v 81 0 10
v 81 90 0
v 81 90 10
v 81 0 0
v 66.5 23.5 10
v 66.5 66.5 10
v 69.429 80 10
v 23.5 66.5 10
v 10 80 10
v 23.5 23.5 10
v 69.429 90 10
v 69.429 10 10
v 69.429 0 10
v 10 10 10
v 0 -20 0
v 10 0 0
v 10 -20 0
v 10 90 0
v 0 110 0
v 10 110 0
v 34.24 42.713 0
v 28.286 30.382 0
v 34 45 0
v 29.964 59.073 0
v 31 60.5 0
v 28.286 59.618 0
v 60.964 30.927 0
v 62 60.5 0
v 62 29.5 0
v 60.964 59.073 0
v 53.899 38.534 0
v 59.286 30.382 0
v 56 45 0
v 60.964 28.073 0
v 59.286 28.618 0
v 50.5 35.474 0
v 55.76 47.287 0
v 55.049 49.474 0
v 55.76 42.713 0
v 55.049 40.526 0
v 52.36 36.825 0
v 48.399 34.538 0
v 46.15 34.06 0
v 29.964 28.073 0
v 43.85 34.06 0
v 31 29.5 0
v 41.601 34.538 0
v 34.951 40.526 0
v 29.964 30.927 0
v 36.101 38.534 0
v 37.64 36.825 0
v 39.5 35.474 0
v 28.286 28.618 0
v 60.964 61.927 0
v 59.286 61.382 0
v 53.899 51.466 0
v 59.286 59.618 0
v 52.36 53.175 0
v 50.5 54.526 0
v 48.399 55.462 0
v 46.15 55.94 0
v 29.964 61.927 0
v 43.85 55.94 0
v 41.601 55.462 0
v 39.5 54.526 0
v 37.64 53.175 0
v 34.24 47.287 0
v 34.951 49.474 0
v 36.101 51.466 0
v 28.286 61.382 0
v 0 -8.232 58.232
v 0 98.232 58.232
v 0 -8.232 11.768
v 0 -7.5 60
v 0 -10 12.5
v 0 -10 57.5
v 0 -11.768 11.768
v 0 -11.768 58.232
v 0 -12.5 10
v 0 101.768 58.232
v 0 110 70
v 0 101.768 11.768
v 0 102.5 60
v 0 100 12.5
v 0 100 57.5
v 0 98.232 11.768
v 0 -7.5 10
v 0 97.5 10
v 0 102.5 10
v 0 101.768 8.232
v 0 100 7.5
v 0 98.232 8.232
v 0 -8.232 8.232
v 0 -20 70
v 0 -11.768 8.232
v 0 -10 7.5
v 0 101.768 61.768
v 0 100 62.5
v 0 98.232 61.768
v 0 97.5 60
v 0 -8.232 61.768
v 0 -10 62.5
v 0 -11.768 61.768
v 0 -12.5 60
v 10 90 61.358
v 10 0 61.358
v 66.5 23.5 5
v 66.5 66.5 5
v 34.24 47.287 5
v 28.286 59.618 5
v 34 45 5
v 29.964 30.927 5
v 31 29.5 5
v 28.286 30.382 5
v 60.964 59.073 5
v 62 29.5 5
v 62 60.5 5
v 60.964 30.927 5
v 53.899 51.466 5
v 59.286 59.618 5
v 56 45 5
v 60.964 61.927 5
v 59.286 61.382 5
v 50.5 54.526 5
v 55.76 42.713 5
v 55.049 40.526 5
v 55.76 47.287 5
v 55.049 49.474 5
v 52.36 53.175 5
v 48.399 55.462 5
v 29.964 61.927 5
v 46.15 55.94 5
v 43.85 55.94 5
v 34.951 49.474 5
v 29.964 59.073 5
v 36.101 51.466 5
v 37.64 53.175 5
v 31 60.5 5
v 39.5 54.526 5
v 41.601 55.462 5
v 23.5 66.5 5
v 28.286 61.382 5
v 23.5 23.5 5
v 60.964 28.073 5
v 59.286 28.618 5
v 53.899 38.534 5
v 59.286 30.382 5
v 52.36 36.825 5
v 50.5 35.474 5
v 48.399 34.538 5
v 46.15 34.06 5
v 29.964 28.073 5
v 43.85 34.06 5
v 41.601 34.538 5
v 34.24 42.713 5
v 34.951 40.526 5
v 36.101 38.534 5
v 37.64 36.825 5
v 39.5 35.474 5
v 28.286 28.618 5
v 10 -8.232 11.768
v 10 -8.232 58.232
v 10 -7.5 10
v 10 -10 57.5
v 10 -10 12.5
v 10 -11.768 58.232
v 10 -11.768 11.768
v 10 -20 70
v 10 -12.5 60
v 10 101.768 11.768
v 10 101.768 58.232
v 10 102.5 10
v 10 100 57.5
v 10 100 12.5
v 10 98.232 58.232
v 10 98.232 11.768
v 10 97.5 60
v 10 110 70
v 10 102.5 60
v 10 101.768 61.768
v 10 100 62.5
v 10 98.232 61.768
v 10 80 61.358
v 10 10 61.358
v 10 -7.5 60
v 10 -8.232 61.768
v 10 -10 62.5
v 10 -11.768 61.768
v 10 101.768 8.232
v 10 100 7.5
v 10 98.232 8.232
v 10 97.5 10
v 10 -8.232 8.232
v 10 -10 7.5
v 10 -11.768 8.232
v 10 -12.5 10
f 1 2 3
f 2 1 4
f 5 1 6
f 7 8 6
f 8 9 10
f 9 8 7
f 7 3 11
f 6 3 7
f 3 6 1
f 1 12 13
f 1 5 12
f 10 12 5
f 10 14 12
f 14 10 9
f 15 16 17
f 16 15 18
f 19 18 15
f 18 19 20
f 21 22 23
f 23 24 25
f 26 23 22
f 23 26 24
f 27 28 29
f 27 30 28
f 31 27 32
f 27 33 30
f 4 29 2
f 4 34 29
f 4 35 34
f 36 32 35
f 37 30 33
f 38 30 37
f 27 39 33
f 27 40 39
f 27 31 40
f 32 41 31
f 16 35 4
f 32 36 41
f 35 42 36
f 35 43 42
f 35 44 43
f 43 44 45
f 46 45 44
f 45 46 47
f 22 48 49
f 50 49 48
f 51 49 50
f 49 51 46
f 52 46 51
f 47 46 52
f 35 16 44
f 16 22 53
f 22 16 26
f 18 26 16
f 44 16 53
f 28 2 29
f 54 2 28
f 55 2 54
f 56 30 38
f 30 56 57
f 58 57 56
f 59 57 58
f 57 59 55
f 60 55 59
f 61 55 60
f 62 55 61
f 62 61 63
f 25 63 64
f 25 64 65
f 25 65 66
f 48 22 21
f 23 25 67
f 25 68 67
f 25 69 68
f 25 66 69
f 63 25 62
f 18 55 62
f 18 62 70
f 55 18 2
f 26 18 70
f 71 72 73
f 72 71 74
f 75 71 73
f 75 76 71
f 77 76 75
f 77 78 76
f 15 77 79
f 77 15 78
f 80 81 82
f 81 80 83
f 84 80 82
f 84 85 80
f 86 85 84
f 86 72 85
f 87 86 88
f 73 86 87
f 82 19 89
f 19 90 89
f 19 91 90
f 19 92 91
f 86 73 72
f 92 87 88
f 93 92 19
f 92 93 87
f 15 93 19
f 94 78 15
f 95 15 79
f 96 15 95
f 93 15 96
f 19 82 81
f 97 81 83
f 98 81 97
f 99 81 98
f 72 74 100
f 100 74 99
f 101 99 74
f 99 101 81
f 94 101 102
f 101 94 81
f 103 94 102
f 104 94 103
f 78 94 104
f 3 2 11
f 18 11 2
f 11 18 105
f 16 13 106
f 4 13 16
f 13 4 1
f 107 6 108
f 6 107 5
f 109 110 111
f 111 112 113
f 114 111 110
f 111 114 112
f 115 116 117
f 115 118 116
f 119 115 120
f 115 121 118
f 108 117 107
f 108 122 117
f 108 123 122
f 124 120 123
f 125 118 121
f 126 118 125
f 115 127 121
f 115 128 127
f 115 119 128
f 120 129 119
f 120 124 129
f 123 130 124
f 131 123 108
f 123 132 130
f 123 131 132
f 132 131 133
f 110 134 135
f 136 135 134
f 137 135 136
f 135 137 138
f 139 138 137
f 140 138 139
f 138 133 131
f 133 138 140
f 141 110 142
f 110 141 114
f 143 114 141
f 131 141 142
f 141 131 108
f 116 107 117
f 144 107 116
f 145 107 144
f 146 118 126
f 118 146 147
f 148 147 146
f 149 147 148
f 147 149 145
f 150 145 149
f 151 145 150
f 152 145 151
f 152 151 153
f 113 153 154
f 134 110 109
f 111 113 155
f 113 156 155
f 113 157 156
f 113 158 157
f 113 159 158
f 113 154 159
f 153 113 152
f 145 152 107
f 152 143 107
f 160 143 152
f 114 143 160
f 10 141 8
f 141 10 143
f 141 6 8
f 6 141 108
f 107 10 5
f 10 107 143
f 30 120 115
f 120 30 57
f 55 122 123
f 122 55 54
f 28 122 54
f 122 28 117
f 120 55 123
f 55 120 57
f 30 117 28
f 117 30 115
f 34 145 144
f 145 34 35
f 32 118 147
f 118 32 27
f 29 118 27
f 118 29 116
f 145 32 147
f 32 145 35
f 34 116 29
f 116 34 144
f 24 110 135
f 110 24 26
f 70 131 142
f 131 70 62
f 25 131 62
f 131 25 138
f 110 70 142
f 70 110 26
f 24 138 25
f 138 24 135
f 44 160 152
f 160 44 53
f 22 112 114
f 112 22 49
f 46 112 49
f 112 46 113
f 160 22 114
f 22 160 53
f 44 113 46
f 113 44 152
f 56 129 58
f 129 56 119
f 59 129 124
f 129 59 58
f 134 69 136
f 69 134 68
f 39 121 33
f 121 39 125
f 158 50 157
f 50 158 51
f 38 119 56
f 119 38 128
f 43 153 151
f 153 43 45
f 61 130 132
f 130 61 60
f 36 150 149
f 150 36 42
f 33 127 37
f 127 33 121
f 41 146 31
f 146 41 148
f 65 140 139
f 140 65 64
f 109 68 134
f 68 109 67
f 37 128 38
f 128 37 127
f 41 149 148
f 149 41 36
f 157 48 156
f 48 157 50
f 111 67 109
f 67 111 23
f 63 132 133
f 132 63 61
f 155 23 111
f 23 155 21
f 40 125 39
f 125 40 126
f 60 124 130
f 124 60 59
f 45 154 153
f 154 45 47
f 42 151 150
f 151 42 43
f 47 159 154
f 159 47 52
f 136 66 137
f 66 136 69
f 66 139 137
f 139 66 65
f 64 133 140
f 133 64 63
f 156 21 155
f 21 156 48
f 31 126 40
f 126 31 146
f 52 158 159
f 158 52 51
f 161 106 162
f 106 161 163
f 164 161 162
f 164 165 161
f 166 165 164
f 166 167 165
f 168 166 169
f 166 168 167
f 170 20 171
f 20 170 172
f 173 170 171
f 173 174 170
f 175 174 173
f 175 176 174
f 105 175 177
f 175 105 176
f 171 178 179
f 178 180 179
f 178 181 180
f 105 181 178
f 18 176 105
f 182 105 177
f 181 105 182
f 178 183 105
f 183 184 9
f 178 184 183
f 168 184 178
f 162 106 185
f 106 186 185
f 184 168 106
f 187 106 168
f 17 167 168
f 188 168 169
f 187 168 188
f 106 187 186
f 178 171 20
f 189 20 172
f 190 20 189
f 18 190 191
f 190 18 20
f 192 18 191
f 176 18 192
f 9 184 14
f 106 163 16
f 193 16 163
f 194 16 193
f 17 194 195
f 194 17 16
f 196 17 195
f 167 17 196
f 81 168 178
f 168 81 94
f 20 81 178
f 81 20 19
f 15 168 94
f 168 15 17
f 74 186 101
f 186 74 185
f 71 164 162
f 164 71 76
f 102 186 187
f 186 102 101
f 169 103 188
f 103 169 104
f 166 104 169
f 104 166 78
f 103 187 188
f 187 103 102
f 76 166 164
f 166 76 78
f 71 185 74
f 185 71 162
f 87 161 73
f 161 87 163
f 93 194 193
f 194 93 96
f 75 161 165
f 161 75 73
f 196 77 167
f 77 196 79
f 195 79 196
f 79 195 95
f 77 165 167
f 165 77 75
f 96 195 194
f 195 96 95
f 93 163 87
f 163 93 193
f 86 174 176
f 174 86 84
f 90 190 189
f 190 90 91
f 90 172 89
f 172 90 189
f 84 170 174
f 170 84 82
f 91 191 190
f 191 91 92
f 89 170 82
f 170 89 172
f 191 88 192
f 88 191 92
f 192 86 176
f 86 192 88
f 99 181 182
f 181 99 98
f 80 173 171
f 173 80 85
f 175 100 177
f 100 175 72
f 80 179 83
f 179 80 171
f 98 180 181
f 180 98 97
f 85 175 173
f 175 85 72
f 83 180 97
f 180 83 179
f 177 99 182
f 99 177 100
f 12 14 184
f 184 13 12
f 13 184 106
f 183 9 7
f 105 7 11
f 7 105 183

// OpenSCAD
distscr=31/2;
cent=45;
rodrad=4;

difference(){
	cube(size = [1.8*cent,2*cent,10], center =false);

	//Motor mount indent
		translate(v=[cent-43/2,cent-43/2,5])
		cube(size = [43,43,5], center =false);

	//Screw holes
		translate(v=[cent+distscr,cent+distscr,0])
		cylinder(h=50, r=1.5, center=false);

		translate(v=[cent+distscr,cent-distscr,0])
		cylinder(h=50, r=1.5, center=false);

		translate(v=[cent-distscr,cent+distscr,0])
		cylinder(h=50, r=1.5, center=false);

		translate(v=[cent-distscr,cent-distscr,0])
		cylinder(h=50, r=1.5, center=false);

		//Motor shaft hole
			translate(v=[cent,cent,0])
			cylinder(h=5, r=11, center=false);
	}

//Base plate

	difference(){
		translate(v=[0,-20,0])
		cube(size = [10,2*cent+40,70], center =false);

		translate(v=[-10,-10,60])
		rotate ([0,90,0]) 
		cylinder(h=50, r=2.5, center=false);

		translate(v=[-10,-10,10])
		rotate ([0,90,0]) 
		cylinder(h=50, r=2.5, center=false);

		translate(v=[-10,2*cent+10,10])
		rotate ([0,90,0]) 
		cylinder(h=50, r=2.5, center=false);

		translate(v=[-10,2*cent+10,60])
		rotate ([0,90,0]) 
		cylinder(h=50, r=2.5, center=false);
	}

//Sides
	//Left triangle
		translate(v=[0,10,0])
		rotate ([90,0,0]) 
		linear_extrude(height = 10, center = false, convexity = 10, twist = 0, slices = 20) {
		polygon(points=[[0,0],[1.8*cent,0],[0,70]],paths=[[0,1,2]]);}

	//Right triangle
		translate(v=[0,2*cent,0])
		rotate ([90,0,0]) 
		linear_extrude(height = 10, center = false, convexity = 10, twist = 0, slices = 20) {
		polygon(points=[[0,0],[1.8*cent,0],[0,70]],paths=[[0,1,2]]);}
